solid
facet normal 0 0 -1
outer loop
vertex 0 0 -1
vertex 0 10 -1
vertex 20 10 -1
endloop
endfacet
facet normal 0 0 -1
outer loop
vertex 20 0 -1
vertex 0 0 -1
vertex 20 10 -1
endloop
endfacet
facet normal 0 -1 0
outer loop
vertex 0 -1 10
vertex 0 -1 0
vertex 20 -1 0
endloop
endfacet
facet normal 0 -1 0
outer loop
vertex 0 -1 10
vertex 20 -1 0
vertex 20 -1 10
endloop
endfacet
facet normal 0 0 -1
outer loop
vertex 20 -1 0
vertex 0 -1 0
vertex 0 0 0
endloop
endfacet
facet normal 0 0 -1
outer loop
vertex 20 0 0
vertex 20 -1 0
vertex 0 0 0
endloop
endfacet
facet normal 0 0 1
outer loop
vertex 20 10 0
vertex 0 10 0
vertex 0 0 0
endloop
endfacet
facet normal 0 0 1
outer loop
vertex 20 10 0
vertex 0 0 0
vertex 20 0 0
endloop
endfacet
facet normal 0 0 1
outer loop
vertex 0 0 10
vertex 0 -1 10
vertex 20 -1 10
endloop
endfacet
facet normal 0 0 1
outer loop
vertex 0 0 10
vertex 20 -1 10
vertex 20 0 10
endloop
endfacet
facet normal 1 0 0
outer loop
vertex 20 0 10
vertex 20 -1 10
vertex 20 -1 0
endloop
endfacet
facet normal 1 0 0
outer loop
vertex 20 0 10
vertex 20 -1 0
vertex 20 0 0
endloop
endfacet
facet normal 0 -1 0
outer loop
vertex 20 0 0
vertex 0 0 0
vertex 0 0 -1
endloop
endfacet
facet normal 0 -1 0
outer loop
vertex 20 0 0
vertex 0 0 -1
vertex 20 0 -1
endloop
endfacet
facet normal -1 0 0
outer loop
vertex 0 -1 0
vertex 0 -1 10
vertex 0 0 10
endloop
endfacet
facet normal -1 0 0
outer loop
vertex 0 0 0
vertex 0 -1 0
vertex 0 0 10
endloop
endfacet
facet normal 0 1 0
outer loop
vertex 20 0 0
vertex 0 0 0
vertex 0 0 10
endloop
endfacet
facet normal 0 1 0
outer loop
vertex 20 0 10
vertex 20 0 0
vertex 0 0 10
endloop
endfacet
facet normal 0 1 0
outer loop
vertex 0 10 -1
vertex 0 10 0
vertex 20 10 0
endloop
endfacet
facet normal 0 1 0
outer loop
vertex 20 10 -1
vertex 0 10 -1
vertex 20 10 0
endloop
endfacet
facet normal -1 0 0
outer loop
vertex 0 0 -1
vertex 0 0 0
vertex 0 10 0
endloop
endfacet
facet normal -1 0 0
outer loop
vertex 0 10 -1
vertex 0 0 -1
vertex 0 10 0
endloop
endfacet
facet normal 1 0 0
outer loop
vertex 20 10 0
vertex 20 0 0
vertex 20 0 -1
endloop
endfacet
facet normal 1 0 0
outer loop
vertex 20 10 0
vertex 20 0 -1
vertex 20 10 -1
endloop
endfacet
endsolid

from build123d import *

# Parameters (mm, degrees)
SKETCH_1_W           = 20
SKETCH_1_H           = 10
BASEPLATE_DEPTH      = 1
LOFTEDBEND_OUTLINE_W = 1
LOFTEDBEND_OUTLINE_H = 10
LOFTEDBEND_DEPTH     = 20


# Read off the part's stored shape, not the designer's step: LoftedBend
# Sheet-metal steps are written as plain solids
with BuildPart() as part:
    # Sketch 1 → BasePlate (new body)
    with BuildSketch(Plane.XY):
        with Locations((10, 5)):
            Rectangle(SKETCH_1_W, SKETCH_1_H)
    extrude(amount=-BASEPLATE_DEPTH)


with BuildPart() as body_2:
    # LoftedBend outline → LoftedBend (new body)
    with BuildSketch(Plane.YZ):
        with Locations((-0.5, 5)):
            Rectangle(LOFTEDBEND_OUTLINE_W, LOFTEDBEND_OUTLINE_H)
    extrude(amount=LOFTEDBEND_DEPTH)


solid = Compound([part.part, body_2.part])
